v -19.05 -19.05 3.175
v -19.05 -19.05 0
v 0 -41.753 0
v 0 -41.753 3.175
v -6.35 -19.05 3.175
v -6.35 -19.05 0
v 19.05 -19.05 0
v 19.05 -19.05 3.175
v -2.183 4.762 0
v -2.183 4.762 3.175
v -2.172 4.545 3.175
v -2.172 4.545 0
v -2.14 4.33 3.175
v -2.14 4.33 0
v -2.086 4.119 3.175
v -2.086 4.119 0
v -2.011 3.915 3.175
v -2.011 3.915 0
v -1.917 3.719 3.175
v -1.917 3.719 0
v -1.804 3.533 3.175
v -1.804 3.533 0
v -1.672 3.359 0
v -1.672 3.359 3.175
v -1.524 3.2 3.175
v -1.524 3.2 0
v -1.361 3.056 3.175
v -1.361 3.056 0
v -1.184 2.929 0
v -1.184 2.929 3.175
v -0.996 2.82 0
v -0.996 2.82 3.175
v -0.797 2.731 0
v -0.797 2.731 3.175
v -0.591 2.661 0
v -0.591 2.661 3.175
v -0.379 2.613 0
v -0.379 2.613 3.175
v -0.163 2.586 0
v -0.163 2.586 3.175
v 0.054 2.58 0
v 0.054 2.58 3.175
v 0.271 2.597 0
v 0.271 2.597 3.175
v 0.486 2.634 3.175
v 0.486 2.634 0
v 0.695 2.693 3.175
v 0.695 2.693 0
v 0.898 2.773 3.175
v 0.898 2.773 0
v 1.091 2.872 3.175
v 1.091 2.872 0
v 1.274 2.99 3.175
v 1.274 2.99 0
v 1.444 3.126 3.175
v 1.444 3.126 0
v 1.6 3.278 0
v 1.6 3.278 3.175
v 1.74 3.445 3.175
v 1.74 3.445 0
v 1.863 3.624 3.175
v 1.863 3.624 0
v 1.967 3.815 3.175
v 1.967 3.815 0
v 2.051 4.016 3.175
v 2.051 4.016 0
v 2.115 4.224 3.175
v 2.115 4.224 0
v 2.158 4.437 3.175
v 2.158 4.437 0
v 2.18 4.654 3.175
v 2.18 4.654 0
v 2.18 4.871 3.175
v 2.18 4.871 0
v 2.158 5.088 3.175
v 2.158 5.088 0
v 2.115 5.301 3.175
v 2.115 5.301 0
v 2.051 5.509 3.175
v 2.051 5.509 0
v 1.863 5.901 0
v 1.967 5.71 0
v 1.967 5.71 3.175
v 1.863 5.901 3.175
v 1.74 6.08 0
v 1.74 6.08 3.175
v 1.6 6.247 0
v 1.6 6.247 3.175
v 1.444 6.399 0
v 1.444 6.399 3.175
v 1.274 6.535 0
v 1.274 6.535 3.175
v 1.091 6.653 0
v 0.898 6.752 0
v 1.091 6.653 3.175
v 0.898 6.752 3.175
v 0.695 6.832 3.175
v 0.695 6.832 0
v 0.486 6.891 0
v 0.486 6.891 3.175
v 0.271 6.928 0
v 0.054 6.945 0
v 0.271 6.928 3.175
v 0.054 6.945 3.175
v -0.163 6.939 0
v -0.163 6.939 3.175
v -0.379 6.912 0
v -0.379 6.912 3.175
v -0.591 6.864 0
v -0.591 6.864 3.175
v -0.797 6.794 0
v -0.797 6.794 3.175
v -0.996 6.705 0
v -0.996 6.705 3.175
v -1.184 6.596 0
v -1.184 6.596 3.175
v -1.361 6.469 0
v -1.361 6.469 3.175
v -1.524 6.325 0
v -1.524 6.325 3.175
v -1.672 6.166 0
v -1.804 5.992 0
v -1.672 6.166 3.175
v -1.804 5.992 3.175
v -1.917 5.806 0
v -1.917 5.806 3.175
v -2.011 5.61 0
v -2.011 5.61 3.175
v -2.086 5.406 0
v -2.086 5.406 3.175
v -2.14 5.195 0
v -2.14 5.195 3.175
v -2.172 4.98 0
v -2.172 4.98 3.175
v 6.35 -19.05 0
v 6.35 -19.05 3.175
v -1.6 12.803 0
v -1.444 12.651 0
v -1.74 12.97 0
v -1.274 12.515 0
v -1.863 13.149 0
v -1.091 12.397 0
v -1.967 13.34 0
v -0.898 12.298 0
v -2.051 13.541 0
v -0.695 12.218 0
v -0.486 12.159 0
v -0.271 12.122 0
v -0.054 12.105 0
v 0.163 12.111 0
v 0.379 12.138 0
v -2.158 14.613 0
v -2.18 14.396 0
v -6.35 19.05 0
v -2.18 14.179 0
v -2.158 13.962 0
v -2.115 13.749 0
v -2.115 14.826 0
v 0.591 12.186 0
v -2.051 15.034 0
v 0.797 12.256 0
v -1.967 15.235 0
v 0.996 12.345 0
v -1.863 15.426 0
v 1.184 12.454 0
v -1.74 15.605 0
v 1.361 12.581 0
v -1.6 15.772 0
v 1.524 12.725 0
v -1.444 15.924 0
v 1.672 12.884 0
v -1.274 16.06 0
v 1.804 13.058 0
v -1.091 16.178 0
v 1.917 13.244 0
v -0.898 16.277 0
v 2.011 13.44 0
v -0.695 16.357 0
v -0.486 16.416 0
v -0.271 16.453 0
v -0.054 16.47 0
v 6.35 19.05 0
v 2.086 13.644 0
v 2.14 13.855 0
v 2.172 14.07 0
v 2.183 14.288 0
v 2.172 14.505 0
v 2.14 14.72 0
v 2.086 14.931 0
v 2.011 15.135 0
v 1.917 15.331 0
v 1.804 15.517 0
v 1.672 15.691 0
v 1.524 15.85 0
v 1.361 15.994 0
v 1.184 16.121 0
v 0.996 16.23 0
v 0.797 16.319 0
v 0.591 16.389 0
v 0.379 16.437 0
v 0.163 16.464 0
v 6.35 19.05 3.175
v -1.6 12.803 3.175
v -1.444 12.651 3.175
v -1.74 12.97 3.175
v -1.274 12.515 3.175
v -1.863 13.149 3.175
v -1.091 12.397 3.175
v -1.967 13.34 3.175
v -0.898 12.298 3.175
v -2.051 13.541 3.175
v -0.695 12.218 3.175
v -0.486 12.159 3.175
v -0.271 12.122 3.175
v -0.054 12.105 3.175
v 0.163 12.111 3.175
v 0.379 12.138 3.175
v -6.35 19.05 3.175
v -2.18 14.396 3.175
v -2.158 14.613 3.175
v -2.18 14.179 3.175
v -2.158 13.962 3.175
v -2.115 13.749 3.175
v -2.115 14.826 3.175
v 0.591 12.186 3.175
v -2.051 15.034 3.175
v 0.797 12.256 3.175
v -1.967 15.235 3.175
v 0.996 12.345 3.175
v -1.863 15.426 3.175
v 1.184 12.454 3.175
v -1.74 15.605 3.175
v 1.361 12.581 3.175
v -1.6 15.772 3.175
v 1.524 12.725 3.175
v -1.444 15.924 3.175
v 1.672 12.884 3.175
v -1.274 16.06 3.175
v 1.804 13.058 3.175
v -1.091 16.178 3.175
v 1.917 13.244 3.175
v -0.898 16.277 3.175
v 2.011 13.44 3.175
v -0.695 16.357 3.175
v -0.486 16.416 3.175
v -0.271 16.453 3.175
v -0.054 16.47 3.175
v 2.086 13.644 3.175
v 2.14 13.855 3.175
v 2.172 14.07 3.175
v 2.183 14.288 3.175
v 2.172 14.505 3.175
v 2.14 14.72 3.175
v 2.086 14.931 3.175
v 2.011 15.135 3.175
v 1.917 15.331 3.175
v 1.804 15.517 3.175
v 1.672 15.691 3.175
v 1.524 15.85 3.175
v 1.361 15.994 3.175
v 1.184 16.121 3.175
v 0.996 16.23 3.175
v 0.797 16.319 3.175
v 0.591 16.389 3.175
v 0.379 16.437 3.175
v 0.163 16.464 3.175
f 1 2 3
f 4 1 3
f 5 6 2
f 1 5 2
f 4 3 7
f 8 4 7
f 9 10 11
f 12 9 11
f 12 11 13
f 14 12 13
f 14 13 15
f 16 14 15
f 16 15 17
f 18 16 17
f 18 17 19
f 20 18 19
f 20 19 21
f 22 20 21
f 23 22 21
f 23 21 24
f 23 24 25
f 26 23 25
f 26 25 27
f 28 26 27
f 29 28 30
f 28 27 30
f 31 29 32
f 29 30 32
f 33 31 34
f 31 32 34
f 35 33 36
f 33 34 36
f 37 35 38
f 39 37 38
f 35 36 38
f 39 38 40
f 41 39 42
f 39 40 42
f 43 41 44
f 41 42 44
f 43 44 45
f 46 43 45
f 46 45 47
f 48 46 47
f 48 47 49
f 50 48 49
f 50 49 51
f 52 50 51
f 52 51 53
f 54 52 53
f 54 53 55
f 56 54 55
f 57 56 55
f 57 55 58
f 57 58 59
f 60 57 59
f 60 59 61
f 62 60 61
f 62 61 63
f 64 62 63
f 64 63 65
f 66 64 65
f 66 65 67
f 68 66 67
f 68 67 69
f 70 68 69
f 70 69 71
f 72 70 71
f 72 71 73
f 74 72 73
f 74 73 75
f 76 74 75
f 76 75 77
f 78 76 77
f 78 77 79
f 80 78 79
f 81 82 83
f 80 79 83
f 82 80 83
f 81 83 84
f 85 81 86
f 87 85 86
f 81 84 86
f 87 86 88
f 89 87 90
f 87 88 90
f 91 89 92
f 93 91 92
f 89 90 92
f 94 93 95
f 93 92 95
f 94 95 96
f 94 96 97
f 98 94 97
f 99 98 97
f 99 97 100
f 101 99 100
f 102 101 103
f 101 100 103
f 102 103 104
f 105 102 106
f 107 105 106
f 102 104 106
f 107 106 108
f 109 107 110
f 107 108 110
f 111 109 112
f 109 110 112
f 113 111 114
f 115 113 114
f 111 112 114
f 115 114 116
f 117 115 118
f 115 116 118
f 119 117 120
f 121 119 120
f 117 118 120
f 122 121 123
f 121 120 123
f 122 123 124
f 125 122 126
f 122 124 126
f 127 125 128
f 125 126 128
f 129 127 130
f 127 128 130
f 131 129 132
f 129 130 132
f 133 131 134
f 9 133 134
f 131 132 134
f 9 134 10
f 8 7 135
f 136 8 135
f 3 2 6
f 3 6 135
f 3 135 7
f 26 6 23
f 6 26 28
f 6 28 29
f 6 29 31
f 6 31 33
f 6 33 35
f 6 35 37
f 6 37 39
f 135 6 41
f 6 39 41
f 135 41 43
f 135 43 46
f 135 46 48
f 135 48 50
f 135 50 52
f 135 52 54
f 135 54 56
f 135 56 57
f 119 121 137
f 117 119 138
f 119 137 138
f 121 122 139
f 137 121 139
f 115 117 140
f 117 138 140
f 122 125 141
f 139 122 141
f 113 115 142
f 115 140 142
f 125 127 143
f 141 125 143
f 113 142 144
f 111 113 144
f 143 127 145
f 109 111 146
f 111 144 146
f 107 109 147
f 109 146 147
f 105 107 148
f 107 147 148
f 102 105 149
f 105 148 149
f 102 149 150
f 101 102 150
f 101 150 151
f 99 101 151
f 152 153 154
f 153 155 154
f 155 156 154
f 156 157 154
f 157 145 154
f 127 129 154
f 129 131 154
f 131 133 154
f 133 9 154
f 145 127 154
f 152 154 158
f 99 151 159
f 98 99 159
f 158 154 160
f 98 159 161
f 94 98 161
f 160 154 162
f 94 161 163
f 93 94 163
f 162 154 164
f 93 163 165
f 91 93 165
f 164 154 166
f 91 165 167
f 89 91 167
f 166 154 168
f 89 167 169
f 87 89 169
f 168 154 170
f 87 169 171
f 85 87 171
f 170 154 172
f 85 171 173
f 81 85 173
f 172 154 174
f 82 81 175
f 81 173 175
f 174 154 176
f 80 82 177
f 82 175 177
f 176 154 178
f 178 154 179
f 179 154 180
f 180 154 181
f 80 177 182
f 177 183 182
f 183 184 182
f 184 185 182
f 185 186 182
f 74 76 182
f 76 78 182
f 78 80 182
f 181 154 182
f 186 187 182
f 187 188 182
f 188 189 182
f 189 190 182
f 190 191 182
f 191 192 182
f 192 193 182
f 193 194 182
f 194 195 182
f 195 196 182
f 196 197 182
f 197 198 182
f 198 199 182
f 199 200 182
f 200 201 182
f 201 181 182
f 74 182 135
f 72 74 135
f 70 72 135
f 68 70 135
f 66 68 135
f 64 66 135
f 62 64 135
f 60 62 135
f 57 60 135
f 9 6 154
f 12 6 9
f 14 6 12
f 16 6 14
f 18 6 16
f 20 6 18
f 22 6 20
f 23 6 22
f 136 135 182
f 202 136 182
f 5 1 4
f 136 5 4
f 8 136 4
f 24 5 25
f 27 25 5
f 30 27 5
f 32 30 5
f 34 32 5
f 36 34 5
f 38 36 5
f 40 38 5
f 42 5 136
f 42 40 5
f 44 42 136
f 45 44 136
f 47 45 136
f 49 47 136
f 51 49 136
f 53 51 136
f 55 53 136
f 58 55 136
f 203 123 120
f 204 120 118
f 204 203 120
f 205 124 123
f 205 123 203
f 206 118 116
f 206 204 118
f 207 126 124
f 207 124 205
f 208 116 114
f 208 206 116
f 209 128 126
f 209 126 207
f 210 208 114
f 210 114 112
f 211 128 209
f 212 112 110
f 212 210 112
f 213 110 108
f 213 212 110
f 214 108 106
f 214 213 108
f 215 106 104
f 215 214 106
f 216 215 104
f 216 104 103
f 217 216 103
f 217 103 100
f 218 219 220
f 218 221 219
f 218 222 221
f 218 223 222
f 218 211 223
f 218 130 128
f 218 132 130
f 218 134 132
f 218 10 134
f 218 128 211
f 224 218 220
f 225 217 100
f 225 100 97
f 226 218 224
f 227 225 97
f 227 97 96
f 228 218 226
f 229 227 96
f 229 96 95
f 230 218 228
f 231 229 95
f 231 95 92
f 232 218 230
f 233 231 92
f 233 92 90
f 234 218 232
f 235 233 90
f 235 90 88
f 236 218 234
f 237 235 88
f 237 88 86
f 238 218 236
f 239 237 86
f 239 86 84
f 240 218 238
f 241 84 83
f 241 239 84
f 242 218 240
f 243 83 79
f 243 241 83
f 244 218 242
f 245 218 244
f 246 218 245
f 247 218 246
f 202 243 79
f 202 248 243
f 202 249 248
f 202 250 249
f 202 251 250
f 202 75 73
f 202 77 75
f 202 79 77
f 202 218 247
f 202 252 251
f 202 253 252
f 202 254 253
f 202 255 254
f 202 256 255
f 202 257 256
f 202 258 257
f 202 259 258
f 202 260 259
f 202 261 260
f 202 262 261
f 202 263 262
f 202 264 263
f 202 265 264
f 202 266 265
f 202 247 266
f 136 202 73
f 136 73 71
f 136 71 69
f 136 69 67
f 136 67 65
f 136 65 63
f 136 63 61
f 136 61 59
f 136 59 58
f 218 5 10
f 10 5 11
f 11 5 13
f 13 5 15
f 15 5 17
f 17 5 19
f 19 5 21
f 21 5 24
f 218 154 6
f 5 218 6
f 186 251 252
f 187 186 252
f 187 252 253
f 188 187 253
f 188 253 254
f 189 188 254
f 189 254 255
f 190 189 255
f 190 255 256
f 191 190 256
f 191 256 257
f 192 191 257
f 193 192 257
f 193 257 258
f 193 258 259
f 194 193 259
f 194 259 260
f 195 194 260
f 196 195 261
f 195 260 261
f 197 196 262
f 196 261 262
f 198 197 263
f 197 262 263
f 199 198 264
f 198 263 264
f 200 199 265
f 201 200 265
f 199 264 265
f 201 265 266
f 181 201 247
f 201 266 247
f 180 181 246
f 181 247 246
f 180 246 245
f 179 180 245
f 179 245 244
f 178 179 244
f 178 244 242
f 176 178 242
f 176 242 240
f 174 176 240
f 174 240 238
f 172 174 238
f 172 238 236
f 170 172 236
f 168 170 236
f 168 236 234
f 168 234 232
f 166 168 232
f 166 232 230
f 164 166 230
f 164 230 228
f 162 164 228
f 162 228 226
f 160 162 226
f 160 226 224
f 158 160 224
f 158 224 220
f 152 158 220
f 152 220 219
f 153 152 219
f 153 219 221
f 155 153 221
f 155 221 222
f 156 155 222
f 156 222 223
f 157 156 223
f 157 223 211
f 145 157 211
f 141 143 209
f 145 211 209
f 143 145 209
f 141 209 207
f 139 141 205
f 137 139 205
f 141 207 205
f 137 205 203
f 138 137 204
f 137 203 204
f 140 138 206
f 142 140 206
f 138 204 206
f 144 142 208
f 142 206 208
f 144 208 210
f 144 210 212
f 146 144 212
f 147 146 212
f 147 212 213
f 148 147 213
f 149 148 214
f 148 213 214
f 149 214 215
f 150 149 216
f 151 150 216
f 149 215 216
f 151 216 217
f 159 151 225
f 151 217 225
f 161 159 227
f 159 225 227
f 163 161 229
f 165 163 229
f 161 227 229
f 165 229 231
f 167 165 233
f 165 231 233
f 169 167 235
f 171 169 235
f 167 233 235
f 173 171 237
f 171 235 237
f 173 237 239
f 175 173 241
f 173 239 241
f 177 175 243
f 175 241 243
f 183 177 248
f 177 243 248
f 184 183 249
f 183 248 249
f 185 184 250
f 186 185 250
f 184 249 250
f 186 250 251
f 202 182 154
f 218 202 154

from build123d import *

# Parameters (mm, degrees)
BOSS_EXTRUDE1_DEPTH = 3.175
SKETCH2_R           = 2.1828125
CUT_EXTRUDE2_DEPTH  = 47.003133364


with BuildPart() as part:
    # Sketch1 → Boss-Extrude1 (new body)
    with BuildSketch(Plane.XY):
        Polygon((-6.35, -19.05), (-19.05, -19.05), (0, -41.752905939), (19.05, -19.05), (6.35, -19.05), (6.35, 19.05), (-6.35, 19.05), align=None)
    extrude(amount=BOSS_EXTRUDE1_DEPTH)

    # Sketch2 → Cut-Extrude2 (cut, through all)
    with BuildSketch(Plane.XY.offset(3.175)):
        with Locations((0, 14.2875)):
            Circle(SKETCH2_R)
        with Locations(Location((0, 4.7625, 0), (0, 0, 180))):
            Circle(SKETCH2_R)
    extrude(amount=-CUT_EXTRUDE2_DEPTH, mode=Mode.SUBTRACT)


solid = part.part
